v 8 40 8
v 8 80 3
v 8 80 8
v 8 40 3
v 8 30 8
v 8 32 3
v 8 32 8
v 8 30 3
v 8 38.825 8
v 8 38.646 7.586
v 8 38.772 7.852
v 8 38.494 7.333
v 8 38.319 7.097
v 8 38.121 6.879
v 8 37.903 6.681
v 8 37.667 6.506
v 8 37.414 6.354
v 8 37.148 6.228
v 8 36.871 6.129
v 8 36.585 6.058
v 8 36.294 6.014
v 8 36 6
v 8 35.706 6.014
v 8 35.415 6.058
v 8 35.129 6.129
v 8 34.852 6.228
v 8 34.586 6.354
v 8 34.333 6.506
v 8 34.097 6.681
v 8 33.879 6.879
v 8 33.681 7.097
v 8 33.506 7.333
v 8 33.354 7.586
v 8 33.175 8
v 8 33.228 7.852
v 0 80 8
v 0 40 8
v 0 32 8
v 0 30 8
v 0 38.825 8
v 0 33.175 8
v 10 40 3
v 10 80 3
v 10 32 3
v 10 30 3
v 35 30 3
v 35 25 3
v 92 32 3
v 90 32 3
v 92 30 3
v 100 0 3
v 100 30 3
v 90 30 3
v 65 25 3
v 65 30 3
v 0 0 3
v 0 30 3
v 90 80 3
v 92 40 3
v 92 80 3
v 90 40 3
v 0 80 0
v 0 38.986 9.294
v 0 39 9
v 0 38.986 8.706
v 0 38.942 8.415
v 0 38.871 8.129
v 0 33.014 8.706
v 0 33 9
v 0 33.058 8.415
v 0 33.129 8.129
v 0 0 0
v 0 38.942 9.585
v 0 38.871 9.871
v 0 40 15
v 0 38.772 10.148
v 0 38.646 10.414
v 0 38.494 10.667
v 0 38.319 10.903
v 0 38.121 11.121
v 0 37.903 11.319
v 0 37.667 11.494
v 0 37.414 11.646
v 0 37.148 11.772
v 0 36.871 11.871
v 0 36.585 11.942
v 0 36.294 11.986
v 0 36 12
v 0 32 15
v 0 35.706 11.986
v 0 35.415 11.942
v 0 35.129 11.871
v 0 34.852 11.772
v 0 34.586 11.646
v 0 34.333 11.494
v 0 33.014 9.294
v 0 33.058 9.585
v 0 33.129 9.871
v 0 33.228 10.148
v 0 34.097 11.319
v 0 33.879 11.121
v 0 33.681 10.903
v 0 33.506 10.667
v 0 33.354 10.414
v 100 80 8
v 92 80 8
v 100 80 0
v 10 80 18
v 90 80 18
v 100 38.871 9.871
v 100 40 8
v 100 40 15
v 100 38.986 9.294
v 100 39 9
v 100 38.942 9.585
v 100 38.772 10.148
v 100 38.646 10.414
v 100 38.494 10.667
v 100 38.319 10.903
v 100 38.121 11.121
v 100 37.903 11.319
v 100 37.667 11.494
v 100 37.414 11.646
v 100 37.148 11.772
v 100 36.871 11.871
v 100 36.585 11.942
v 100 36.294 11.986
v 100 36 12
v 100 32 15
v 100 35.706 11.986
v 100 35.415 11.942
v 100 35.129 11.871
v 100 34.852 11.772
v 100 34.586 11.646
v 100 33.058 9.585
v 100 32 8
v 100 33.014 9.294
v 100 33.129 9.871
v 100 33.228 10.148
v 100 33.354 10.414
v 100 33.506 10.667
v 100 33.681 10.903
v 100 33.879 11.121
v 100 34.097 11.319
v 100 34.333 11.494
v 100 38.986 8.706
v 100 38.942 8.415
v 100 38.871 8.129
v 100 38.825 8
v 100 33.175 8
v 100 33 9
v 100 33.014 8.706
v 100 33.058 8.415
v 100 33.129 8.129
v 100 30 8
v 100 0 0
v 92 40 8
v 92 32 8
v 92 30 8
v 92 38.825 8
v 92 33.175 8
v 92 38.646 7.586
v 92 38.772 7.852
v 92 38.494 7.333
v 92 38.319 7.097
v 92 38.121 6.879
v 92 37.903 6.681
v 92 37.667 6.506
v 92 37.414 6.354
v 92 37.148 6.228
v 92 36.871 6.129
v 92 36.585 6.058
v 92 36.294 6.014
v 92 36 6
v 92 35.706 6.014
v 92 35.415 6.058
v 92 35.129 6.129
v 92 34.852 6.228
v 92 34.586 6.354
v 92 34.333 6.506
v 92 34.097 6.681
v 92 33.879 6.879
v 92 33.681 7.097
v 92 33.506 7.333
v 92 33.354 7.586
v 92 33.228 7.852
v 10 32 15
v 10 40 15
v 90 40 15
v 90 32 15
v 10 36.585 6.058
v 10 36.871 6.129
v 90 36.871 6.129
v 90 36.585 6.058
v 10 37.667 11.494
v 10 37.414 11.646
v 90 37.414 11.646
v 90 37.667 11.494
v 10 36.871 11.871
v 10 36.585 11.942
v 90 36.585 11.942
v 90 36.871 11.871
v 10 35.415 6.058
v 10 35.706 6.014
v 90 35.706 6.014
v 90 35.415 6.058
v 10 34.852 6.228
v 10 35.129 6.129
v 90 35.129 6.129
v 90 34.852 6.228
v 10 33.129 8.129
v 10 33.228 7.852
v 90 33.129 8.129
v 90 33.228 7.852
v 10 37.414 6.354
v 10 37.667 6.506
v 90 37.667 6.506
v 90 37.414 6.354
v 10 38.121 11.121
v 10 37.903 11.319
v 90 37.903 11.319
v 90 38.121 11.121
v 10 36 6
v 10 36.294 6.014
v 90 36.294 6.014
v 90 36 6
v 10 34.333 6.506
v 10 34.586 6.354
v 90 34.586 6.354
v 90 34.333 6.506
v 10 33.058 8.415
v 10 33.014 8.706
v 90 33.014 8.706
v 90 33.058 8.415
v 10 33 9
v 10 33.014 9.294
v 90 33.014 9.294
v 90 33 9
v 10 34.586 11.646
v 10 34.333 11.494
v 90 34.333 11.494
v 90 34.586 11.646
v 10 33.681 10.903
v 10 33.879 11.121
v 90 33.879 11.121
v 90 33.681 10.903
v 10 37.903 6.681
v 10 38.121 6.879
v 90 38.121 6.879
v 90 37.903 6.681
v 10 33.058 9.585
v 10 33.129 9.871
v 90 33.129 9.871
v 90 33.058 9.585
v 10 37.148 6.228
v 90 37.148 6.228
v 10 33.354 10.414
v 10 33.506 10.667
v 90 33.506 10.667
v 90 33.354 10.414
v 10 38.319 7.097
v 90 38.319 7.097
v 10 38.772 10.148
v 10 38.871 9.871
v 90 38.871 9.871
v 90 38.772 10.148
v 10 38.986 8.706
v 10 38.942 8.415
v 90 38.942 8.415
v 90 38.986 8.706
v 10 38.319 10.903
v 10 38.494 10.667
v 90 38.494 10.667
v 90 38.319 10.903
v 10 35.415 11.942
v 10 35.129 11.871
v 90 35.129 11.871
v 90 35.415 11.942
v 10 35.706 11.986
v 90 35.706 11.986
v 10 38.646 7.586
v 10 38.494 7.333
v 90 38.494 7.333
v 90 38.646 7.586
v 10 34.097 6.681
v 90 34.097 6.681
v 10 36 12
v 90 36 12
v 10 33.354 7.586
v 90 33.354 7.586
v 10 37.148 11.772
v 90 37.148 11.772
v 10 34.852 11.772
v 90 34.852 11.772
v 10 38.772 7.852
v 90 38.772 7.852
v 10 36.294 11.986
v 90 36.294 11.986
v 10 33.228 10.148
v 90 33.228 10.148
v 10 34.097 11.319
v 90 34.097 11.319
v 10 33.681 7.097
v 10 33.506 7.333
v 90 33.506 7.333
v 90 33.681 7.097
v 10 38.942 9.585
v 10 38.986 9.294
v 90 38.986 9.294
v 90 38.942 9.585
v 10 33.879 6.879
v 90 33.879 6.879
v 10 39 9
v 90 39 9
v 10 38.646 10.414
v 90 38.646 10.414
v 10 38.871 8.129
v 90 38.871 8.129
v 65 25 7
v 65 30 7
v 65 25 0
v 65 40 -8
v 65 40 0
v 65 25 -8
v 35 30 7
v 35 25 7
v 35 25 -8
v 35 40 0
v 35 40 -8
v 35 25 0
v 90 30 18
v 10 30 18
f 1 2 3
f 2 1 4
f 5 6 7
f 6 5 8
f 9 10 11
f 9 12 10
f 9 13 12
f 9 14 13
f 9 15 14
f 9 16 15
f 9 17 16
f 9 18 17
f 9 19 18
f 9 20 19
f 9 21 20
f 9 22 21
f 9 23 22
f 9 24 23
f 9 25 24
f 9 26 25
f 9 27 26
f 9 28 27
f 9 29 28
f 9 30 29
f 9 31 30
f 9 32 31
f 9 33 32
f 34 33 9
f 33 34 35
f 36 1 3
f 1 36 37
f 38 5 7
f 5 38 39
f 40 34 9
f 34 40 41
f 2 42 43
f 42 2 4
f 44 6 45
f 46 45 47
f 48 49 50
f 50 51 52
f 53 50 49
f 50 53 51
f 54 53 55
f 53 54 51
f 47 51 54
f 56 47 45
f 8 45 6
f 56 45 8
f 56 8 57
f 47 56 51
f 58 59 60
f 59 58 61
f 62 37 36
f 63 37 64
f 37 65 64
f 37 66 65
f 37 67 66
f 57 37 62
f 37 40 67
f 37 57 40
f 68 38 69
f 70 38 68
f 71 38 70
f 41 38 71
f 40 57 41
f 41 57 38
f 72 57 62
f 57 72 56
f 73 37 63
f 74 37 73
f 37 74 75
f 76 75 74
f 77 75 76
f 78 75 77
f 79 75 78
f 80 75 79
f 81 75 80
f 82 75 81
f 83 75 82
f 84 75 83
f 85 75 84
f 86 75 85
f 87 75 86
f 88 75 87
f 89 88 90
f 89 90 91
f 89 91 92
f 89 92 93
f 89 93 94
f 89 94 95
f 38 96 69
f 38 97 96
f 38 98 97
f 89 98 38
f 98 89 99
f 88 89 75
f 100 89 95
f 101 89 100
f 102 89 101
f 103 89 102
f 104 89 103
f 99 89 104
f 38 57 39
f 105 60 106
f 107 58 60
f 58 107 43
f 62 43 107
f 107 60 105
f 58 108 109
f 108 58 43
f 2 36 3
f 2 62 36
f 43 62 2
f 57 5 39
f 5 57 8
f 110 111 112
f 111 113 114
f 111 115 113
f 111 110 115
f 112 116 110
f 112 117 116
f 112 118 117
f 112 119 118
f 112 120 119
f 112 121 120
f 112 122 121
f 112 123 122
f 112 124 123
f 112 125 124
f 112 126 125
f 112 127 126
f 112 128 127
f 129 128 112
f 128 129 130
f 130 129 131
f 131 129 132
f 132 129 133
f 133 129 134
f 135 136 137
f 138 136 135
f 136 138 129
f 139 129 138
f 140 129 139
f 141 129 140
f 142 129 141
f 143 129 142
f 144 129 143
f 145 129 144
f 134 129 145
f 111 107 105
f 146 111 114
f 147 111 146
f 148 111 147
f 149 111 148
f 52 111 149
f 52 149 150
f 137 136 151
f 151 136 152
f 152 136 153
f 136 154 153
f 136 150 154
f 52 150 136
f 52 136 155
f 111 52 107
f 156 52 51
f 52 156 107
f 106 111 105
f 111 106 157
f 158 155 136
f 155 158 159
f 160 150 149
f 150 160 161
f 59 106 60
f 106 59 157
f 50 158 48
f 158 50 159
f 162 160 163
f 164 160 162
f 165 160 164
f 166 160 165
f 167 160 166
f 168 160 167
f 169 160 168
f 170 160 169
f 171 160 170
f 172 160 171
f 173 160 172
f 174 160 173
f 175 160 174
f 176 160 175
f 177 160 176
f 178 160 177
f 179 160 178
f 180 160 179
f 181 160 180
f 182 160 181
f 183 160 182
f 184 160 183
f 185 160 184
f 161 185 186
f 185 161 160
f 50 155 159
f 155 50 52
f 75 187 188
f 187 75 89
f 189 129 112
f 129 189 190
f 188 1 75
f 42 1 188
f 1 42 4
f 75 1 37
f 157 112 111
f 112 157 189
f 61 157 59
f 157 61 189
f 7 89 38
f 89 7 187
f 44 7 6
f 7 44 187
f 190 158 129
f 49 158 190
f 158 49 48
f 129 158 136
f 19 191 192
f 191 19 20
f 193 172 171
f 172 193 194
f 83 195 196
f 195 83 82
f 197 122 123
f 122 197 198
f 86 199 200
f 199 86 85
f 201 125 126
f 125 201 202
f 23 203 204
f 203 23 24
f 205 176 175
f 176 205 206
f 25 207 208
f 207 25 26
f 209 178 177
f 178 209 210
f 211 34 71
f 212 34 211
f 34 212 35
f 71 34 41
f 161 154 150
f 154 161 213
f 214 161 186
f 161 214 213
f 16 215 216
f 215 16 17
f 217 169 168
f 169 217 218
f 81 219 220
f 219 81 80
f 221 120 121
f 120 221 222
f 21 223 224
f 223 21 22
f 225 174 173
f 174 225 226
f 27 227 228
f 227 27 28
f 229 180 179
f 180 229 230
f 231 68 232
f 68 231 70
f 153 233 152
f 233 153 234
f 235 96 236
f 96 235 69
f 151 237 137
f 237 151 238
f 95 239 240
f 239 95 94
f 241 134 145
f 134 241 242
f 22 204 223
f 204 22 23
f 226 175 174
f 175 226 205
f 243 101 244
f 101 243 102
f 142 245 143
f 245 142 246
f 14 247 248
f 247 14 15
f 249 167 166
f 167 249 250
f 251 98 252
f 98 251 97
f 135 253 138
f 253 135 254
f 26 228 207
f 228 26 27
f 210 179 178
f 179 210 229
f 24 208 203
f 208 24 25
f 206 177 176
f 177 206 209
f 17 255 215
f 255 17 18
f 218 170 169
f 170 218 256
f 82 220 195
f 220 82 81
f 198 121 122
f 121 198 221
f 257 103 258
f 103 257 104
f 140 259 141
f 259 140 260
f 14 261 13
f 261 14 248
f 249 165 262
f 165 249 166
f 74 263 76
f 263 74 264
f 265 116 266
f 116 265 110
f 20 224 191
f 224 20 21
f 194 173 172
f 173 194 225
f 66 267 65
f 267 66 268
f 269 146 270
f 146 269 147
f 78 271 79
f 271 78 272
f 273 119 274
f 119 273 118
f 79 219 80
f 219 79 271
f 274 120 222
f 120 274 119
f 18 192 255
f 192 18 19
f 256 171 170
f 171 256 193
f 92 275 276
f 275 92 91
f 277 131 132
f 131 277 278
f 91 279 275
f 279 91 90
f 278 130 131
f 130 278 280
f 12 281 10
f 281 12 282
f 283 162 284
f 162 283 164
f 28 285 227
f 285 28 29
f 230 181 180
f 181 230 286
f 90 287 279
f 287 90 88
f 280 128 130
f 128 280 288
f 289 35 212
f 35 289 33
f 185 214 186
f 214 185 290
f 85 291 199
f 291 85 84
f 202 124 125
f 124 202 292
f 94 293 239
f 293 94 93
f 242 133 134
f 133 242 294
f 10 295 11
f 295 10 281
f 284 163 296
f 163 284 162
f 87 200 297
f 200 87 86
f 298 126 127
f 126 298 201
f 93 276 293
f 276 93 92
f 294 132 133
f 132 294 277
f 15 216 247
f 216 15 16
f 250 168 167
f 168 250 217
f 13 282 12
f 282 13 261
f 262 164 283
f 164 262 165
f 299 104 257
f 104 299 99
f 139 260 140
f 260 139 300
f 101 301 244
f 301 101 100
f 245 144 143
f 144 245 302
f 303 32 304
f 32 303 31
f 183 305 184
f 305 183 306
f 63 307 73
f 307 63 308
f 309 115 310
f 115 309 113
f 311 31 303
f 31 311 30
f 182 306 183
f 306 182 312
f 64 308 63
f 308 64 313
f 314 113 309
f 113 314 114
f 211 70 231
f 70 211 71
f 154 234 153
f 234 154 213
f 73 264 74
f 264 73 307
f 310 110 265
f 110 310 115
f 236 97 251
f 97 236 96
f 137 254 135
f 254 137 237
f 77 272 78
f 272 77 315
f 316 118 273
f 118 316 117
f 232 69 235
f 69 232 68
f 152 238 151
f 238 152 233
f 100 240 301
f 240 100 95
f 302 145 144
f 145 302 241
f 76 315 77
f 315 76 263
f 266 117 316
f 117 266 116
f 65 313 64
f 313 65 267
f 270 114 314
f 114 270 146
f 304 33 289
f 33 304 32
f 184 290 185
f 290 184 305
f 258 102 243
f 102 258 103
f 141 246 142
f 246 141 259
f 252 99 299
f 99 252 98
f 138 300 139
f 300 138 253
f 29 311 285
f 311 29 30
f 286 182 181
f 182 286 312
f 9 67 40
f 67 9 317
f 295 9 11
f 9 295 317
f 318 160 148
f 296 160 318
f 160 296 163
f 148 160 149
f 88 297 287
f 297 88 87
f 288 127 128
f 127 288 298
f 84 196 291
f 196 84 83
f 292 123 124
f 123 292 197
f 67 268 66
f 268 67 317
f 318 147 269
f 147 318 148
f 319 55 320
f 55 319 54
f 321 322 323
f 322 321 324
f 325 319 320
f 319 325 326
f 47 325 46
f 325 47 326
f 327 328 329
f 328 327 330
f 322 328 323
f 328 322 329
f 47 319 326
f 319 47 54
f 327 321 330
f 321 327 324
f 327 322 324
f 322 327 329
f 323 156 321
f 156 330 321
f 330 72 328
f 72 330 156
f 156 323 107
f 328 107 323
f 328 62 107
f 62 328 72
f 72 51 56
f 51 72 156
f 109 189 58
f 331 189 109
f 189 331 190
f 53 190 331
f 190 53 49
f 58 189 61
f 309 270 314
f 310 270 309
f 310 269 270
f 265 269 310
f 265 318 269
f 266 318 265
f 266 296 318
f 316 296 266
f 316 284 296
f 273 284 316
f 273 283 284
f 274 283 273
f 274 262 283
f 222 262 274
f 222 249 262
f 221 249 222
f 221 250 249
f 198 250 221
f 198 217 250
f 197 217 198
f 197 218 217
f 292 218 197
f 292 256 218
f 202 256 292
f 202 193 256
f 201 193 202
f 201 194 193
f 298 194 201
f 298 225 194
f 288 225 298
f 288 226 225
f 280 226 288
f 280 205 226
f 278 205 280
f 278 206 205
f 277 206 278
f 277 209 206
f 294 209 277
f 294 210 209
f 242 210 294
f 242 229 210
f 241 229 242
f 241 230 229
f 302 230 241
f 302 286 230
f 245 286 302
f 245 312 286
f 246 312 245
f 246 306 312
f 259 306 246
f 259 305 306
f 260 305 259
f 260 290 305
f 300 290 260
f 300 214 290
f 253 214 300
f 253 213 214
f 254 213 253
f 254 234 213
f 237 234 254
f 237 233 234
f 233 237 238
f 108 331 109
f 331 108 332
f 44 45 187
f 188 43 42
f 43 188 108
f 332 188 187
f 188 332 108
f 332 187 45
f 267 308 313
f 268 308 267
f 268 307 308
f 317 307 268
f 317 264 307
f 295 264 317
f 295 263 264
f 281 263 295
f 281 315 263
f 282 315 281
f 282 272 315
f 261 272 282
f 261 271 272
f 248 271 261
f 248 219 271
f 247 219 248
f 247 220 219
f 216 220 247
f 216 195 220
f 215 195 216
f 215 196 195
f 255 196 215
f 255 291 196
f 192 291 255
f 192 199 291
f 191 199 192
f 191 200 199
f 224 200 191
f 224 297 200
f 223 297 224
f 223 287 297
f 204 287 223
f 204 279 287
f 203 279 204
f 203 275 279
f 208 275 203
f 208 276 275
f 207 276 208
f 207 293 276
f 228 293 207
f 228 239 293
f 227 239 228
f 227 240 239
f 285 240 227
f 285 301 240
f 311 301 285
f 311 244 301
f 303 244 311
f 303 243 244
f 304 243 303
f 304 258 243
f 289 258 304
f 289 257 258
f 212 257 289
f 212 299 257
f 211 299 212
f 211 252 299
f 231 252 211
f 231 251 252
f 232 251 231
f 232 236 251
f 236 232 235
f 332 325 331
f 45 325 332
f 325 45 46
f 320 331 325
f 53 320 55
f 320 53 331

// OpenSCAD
// Resolution control for smooth curves
$fn = 64;

// Base slab dimensions
base_width = 100;
base_depth = 80;
base_thickness = 3;

// Rear raised portion dimensions
rear_width = 80;
rear_depth = 50;
rear_height = 15;

// Side strip dimensions
strip_width = 8;
strip_height = 5;

// Transverse feature dimensions
trans_width = base_width;
trans_depth = 8;
trans_height = 12;
hole_diameter = 6;
trans_y_pos = base_depth * 0.4;

// Stepped feature dimensions
step_width = 30;
step_depth = 15;
shallow_height = 4;
deep_extension = 8;
step_y_pos = base_depth - rear_depth - 5;

// Module: Base slab
module base_slab() {
    cube([base_width, base_depth, base_thickness]);
}

// Module: Rear raised block
module rear_block() {
    translate([(base_width - rear_width)/2, base_depth - rear_depth, base_thickness])
        cube([rear_width, rear_depth, rear_height]);
}

// Module: Left and right side strips
module side_strips() {
    translate([0, base_depth - rear_depth, base_thickness])
        cube([strip_width, rear_depth, strip_height]);
    translate([base_width - strip_width, base_depth - rear_depth, base_thickness])
        cube([strip_width, rear_depth, strip_height]);
}

// Module: Transverse feature with internal opening
module transverse_feature() {
    difference() {
        translate([0, trans_y_pos, base_thickness])
            cube([trans_width, trans_depth, trans_height]);
        // Through-hole spanning the width
        translate([base_width/2, trans_y_pos + trans_depth/2, base_thickness + trans_height/2])
            rotate([0, 90, 0])
            cylinder(h=trans_width + 4, d=hole_diameter, center=true);
    }
}

// Module: Stepped vertical extents
module stepped_feature() {
    // Shallow addition on top of base shoulder
    translate([(base_width - step_width)/2, step_y_pos, base_thickness])
        cube([step_width, step_depth, shallow_height]);
    // Aligned continuation extending deeper below base level
    translate([(base_width - step_width)/2, step_y_pos, -deep_extension])
        cube([step_width, step_depth, base_thickness + deep_extension]);
}

// Main assembly: additive construction
union() {
    base_slab();
    rear_block();
    side_strips();
    transverse_feature();
    stepped_feature();
}
